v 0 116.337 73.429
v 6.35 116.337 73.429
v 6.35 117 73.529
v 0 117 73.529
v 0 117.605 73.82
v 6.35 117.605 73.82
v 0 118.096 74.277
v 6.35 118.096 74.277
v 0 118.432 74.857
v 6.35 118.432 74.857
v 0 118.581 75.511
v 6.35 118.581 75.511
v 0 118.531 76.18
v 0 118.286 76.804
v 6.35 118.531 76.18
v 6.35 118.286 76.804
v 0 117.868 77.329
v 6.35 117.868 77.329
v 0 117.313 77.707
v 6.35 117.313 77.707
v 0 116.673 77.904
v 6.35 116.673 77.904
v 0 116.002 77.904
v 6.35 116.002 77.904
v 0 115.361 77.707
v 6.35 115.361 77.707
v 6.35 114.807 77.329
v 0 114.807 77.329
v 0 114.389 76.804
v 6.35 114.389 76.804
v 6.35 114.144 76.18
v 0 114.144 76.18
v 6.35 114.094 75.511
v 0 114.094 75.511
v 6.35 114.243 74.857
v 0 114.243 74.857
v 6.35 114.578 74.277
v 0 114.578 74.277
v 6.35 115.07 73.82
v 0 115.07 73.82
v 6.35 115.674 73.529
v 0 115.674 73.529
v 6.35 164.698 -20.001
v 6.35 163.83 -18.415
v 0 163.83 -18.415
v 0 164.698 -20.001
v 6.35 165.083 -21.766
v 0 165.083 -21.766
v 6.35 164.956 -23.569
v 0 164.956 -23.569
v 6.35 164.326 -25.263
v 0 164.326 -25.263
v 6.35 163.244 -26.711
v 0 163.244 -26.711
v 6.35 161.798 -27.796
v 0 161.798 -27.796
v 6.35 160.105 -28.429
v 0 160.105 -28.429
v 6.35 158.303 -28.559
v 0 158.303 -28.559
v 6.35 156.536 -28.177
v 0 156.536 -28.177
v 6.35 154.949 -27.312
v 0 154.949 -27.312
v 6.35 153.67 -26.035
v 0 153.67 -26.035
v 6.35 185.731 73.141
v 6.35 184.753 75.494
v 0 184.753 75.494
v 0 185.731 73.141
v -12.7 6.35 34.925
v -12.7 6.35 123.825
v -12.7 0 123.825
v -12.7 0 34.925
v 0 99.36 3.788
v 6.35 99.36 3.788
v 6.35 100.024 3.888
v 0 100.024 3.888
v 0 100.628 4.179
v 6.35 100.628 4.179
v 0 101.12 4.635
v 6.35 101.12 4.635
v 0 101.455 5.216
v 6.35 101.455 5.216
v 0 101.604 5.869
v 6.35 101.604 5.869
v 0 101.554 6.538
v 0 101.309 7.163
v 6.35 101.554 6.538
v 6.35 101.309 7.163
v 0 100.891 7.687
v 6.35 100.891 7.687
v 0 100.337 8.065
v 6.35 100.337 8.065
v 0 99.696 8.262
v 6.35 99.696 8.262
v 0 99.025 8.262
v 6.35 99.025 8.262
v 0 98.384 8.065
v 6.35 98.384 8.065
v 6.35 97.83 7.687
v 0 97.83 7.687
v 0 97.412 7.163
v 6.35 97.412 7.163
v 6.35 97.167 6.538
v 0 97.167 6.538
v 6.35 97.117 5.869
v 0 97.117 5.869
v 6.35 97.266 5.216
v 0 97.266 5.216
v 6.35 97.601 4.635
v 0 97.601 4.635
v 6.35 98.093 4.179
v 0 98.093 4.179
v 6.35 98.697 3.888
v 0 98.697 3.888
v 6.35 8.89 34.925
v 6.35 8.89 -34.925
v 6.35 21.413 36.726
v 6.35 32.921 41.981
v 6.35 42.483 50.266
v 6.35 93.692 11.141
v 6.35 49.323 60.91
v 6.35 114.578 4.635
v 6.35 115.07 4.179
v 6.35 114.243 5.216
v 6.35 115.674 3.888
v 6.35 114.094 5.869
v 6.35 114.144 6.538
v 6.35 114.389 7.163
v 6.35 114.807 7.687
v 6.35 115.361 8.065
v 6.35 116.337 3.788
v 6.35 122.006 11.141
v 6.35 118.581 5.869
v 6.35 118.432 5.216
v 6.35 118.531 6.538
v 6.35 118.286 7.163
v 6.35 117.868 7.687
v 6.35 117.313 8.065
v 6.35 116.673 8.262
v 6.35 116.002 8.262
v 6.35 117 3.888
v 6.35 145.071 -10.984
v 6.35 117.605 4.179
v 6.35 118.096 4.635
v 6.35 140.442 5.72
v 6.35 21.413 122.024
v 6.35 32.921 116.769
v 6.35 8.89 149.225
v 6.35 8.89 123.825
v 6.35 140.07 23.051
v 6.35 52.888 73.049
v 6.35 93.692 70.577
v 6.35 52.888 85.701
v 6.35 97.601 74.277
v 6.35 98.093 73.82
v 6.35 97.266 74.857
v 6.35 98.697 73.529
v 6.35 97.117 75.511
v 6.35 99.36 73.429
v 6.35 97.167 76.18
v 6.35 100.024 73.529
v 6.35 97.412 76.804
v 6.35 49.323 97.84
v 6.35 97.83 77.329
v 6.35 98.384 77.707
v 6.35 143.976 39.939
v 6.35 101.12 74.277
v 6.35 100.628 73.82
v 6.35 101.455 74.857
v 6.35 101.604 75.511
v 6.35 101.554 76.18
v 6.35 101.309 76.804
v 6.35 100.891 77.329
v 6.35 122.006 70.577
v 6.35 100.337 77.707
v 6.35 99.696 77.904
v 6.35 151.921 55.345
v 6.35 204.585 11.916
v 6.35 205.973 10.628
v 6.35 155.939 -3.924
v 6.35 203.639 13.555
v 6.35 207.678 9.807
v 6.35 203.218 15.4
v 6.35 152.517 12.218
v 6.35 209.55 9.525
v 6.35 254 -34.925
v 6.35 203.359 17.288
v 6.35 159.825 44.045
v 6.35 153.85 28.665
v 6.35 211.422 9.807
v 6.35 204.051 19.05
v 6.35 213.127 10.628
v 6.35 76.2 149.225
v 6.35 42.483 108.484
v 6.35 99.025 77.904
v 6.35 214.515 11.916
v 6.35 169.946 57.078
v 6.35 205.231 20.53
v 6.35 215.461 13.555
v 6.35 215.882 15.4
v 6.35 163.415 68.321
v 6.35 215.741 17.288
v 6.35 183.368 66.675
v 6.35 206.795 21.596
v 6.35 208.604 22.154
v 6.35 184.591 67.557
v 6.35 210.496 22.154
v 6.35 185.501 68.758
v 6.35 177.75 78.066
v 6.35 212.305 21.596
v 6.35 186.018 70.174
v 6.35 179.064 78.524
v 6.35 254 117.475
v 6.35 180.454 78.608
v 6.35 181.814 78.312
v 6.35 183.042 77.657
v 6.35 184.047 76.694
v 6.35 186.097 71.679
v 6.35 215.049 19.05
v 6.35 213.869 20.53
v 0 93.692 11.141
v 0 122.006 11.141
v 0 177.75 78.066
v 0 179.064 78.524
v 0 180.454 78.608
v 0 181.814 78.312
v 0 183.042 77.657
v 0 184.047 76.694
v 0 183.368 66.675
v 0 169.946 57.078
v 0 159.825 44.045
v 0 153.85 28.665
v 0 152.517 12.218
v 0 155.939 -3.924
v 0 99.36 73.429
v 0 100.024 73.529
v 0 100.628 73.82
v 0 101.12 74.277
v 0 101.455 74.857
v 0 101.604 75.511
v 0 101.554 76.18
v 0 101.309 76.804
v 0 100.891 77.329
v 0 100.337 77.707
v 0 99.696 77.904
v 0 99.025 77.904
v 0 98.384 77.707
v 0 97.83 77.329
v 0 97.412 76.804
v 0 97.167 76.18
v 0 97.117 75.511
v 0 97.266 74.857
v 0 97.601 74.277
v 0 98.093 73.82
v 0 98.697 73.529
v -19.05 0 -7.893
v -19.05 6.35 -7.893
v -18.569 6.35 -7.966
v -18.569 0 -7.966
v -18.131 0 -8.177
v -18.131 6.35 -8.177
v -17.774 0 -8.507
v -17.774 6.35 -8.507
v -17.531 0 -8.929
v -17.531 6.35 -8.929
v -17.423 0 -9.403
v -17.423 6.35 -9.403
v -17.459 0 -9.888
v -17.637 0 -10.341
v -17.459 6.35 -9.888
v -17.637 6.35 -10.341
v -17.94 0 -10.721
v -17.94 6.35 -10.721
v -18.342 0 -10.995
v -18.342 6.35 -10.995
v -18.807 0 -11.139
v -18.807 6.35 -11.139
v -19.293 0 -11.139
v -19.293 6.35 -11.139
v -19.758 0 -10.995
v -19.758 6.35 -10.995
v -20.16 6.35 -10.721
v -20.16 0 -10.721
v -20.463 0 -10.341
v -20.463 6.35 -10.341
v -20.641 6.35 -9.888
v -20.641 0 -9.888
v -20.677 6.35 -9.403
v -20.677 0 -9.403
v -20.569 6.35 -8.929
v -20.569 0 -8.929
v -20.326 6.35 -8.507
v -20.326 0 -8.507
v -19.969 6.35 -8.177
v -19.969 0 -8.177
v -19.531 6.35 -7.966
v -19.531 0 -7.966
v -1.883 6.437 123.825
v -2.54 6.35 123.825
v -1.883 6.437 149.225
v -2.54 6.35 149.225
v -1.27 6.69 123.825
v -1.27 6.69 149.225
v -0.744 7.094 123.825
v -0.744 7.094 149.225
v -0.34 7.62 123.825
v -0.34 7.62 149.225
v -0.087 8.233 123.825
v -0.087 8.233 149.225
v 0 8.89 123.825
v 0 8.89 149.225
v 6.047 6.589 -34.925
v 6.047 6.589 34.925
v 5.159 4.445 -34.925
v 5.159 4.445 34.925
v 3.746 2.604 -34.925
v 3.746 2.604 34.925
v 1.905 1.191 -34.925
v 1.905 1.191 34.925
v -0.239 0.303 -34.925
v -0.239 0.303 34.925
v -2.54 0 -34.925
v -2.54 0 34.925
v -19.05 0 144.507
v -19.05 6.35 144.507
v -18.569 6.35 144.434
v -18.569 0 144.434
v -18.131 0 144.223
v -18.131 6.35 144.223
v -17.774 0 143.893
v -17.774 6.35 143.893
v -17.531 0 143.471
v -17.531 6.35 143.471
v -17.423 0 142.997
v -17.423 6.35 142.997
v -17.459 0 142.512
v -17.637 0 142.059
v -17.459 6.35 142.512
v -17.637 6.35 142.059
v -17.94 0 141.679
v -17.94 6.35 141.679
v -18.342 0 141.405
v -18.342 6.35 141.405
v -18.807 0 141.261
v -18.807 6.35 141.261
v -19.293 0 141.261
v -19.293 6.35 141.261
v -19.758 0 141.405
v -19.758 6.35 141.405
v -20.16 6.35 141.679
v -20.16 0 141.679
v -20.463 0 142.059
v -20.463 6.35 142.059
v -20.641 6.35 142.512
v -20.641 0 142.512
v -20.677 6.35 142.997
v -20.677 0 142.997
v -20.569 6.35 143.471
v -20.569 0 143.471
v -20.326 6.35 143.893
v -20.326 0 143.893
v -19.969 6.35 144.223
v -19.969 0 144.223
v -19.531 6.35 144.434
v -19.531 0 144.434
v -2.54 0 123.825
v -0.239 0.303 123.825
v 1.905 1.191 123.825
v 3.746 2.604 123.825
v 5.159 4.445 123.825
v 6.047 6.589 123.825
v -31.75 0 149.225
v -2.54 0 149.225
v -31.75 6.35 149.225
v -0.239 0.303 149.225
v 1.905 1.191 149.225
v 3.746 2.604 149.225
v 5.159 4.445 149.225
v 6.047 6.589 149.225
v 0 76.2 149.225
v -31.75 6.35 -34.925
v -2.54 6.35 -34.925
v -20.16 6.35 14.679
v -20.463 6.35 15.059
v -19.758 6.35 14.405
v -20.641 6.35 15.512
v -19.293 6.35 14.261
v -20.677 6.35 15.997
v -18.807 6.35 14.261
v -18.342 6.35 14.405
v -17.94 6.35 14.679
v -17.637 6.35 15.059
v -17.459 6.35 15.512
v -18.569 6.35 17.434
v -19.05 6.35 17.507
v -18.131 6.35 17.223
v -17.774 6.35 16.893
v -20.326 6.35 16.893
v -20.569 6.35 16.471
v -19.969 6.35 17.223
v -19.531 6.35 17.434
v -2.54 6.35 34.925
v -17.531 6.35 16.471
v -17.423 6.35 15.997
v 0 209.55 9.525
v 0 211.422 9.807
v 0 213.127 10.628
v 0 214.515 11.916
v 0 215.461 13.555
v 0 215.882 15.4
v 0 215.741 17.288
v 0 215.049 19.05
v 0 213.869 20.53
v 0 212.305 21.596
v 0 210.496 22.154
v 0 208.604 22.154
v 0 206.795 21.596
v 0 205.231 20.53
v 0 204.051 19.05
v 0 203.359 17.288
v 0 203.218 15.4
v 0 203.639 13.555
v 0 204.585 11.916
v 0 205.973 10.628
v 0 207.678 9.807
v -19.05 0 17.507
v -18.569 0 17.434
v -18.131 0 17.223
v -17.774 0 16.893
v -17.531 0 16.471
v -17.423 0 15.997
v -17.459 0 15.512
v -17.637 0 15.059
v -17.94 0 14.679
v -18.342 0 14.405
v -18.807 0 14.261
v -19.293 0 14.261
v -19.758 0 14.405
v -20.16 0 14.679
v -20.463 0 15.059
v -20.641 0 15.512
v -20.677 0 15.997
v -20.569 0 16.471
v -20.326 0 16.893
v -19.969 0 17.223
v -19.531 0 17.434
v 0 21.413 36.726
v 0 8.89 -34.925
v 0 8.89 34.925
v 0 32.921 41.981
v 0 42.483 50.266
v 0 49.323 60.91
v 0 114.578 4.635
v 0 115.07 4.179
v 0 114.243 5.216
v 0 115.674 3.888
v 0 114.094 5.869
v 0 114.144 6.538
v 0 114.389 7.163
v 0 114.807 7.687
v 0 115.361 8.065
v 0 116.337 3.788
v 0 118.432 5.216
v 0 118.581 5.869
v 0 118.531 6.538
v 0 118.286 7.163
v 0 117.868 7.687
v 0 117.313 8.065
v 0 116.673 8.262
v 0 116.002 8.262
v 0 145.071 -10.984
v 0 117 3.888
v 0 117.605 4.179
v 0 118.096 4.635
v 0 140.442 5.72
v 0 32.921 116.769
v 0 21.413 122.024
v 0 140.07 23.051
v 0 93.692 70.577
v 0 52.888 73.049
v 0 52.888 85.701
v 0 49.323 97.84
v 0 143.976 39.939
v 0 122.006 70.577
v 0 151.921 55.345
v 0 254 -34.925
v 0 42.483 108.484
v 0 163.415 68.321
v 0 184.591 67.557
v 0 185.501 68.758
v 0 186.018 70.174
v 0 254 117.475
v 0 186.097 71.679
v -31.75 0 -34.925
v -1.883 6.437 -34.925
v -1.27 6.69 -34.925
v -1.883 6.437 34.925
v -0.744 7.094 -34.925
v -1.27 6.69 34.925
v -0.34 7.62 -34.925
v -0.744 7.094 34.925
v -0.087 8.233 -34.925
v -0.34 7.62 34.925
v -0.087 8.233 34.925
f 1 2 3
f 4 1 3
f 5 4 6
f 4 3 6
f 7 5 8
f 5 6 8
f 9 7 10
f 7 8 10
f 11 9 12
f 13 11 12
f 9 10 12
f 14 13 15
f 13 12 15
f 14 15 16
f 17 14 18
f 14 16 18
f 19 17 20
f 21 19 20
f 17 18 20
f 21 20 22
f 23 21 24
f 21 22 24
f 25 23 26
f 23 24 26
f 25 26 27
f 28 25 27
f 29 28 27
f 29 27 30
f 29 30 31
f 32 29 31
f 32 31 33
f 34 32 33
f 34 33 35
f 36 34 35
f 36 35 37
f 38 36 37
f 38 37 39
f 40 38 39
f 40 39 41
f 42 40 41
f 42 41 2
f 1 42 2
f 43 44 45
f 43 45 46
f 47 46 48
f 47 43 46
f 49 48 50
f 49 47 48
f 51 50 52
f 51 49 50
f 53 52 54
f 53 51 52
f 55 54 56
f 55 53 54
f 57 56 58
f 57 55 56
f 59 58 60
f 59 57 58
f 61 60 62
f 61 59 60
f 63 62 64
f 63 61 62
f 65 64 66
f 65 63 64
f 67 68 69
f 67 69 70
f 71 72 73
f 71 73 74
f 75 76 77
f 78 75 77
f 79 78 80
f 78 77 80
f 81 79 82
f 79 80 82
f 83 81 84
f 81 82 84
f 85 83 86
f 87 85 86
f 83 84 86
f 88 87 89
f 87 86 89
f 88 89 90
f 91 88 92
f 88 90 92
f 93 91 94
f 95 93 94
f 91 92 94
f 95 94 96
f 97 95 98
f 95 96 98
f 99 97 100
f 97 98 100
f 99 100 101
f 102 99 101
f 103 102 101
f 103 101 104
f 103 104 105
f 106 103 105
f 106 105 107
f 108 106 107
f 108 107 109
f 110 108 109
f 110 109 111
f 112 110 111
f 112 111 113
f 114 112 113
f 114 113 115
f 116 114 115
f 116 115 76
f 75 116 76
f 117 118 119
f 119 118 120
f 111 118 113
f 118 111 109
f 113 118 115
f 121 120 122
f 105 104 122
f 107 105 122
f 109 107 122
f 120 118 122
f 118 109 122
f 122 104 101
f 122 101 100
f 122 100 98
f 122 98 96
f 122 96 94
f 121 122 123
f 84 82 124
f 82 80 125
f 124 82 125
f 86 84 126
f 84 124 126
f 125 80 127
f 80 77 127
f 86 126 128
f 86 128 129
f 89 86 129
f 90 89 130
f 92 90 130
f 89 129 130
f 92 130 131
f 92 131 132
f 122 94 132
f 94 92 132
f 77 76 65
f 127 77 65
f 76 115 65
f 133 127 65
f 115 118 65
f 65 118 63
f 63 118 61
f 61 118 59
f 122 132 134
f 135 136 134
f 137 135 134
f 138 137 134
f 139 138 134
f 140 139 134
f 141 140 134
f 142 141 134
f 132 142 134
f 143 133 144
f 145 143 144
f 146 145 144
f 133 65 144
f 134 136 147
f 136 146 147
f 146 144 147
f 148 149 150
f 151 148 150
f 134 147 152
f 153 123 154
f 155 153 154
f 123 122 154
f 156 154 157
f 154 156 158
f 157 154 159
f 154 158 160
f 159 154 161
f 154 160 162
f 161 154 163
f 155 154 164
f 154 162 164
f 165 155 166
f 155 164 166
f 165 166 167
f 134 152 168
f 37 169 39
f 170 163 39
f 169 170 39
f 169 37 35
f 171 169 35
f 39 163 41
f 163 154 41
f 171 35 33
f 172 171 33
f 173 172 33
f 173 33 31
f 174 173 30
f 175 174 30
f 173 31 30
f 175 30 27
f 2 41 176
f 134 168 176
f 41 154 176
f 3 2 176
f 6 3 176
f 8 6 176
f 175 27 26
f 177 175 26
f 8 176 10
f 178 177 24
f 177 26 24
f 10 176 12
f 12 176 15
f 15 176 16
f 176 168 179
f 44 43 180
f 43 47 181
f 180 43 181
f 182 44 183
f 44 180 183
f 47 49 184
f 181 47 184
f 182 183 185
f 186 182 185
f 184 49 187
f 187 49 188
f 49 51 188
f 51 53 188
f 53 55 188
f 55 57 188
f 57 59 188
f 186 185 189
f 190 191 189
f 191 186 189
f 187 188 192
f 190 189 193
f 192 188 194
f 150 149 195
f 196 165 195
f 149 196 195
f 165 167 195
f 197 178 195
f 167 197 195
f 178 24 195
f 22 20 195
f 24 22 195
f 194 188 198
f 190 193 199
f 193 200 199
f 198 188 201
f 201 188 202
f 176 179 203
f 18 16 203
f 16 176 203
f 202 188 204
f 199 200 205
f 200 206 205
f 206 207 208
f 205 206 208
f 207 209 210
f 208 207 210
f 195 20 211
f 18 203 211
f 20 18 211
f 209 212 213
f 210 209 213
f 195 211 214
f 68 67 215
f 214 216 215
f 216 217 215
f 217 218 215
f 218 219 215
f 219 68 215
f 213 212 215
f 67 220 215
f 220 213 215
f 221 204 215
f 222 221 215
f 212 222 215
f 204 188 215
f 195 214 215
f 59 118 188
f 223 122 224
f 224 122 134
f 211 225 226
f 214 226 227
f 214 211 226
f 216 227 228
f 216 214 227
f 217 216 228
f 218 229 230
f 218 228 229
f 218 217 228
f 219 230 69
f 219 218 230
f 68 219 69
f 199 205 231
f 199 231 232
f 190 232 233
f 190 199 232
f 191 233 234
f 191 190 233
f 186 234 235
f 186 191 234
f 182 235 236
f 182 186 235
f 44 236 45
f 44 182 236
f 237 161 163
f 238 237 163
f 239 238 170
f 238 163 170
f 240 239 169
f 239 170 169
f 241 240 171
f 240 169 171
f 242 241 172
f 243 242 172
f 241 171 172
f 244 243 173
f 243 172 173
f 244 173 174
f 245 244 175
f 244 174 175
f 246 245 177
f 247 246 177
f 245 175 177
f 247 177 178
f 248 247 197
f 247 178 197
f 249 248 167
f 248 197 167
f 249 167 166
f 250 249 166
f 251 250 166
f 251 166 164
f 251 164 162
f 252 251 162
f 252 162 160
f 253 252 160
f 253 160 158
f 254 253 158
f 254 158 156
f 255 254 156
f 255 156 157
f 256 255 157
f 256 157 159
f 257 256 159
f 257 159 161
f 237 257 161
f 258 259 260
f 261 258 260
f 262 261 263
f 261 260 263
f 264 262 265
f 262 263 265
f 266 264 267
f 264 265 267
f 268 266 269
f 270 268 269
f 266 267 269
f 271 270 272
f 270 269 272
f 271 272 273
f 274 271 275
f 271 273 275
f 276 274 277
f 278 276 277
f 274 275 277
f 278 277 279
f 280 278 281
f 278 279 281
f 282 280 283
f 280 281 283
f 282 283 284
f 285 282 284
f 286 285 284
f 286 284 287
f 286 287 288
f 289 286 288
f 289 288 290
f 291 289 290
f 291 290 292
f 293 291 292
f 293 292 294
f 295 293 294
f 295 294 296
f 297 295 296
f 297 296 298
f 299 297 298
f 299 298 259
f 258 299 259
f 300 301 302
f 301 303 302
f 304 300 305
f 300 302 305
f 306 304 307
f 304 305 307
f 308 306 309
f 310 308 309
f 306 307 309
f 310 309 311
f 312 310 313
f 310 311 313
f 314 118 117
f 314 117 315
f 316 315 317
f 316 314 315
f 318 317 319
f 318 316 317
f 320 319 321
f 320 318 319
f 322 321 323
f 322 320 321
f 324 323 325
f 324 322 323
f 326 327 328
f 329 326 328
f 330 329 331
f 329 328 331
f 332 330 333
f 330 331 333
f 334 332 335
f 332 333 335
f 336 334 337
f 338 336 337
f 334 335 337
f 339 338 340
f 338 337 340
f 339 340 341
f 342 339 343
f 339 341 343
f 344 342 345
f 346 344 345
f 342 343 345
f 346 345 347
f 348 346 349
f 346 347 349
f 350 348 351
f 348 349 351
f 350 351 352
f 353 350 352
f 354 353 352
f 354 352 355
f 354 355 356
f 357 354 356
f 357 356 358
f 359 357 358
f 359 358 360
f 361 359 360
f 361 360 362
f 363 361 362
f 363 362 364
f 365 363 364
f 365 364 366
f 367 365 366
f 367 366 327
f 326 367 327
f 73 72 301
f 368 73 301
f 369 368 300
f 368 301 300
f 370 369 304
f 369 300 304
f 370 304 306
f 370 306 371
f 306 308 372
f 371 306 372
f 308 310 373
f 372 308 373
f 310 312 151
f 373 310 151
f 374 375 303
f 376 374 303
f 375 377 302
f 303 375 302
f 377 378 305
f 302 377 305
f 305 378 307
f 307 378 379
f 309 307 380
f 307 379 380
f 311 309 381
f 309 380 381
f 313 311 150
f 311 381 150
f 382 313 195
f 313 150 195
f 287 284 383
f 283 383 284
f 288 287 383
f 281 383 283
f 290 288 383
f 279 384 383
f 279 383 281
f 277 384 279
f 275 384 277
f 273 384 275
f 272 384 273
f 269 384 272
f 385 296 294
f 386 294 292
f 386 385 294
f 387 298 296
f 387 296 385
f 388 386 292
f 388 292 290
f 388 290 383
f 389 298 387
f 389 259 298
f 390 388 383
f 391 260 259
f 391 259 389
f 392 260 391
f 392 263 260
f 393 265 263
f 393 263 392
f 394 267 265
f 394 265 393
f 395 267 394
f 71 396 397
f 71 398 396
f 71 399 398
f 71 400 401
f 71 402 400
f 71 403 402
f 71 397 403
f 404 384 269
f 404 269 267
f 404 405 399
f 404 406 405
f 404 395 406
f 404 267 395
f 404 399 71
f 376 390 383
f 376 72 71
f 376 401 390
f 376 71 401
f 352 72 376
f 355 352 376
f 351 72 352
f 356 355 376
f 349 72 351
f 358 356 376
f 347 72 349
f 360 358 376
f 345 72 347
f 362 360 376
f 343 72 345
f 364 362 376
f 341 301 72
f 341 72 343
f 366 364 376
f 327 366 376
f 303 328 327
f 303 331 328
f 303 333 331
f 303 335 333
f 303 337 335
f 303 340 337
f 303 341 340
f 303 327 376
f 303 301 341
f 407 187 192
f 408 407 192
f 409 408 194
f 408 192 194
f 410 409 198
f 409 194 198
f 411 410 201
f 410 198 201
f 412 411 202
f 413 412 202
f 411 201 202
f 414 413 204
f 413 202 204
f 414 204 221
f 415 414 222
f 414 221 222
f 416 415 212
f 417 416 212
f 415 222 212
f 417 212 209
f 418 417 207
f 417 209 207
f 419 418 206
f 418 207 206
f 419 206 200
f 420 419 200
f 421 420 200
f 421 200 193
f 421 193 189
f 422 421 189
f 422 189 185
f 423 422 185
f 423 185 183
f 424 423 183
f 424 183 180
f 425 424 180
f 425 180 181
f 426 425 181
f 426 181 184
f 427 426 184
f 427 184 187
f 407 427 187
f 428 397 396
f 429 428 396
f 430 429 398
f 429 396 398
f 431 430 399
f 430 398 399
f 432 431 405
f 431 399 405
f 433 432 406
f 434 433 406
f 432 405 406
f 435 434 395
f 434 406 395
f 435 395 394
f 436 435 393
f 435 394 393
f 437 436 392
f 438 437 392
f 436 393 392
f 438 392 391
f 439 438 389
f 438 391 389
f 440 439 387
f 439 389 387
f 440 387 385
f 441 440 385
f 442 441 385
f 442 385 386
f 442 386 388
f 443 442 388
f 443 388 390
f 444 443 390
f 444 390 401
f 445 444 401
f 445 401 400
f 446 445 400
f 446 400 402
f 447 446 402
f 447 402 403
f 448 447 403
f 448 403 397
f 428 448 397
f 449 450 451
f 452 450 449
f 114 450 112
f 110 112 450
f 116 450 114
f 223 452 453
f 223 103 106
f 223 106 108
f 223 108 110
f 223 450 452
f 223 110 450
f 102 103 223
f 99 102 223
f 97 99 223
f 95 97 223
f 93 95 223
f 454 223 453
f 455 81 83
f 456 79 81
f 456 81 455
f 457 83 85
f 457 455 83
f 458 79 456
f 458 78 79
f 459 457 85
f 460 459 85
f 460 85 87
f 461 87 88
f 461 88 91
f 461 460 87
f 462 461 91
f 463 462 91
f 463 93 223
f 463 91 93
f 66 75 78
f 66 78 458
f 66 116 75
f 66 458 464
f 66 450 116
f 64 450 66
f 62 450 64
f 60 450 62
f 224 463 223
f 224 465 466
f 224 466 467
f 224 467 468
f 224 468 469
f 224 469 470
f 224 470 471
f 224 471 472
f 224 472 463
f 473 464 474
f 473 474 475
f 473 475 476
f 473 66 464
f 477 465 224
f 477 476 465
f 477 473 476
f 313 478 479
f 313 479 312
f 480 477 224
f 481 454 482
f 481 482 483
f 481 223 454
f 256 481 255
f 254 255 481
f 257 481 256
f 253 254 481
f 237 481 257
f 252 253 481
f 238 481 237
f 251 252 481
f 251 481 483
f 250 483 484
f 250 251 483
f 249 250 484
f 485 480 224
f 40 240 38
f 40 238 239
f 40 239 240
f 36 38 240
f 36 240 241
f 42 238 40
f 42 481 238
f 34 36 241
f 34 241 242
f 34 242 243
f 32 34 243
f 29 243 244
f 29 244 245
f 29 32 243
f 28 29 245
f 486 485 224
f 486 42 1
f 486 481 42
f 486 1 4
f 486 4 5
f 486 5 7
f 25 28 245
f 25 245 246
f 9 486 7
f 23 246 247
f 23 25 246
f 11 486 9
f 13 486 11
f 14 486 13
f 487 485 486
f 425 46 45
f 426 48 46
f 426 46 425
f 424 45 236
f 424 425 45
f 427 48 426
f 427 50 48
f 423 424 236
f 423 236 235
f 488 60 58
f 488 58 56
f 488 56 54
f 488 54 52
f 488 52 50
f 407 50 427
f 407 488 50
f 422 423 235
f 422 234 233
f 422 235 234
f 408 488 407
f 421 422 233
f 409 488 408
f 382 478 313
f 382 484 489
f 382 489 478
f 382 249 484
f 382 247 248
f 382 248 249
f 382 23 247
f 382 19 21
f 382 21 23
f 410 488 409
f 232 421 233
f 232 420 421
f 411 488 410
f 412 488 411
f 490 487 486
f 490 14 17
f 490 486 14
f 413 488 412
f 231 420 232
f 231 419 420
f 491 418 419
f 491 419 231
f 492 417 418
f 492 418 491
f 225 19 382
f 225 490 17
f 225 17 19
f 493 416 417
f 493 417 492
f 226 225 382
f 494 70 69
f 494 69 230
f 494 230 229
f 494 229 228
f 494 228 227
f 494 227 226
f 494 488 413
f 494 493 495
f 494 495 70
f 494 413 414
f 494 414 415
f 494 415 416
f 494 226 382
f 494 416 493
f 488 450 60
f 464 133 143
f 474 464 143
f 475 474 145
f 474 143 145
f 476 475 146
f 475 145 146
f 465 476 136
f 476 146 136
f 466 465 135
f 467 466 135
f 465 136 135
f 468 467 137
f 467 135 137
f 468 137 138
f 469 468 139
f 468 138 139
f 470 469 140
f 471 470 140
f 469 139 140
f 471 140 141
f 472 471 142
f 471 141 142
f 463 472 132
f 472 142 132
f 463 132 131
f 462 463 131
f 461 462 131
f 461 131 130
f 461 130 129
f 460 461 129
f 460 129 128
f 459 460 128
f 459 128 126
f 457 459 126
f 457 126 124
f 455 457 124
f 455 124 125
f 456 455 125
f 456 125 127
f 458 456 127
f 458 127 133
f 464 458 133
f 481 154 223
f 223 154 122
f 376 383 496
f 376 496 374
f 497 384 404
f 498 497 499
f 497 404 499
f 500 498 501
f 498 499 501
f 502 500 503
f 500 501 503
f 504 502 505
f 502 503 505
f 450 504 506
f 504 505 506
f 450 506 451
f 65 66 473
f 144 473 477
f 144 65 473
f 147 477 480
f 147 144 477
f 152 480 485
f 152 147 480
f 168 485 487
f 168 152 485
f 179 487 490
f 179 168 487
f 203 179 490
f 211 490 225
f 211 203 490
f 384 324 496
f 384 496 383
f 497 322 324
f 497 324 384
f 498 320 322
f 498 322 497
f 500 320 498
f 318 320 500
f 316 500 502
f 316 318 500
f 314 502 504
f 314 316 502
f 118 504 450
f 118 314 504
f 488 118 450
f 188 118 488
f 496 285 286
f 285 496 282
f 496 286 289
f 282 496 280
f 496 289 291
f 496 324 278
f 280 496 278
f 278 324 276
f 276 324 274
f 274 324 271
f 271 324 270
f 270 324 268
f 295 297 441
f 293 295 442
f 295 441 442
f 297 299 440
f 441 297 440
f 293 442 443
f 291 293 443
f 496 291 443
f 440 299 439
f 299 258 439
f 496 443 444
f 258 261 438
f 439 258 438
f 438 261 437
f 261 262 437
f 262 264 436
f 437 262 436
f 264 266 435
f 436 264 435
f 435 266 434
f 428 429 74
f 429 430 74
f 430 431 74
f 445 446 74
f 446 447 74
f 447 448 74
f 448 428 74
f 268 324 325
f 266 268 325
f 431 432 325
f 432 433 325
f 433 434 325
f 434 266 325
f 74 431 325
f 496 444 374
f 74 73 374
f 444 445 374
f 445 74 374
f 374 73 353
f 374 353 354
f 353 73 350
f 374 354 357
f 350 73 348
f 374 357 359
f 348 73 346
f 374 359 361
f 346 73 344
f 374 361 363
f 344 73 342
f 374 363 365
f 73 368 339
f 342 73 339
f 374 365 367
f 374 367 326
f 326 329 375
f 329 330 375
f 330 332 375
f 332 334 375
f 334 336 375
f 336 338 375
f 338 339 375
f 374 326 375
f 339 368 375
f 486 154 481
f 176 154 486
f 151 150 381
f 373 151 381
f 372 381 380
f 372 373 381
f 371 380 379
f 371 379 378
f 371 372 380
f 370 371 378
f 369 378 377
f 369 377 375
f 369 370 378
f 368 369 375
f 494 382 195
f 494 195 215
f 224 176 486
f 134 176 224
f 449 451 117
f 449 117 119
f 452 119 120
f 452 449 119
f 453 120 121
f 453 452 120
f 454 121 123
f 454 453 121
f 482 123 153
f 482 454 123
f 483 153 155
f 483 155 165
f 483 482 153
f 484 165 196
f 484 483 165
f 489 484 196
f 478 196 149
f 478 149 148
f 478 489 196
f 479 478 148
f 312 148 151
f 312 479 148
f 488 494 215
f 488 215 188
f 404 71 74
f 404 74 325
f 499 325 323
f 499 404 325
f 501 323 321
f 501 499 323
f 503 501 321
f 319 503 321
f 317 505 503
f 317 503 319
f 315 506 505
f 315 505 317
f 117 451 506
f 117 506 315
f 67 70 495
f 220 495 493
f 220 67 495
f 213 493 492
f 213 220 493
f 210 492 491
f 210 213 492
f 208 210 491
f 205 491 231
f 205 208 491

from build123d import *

# Parameters (mm, degrees)
BOSS_EXTRUDE1_DEPTH  = 6.35
SKETCH5_W            = 184.15
SKETCH5_H            = 6.35
BOSS_EXTRUDE4_DEPTH  = 31.75
SKETCH6_W            = 12.7
SKETCH6_H            = 88.9
CUT_EXTRUDE2_DEPTH   = 291.872284044
CUT_EXTRUDE3_REACH   = 299.045
SKETCH7_R            = 2.25
SKETCH7_W            = 59.436
SKETCH7_H            = 28.313784743
SKETCH8_R            = 6.35
CUT_EXTRUDE4_DEPTH   = 298.044963979
FILLET1_R            = 2.54
CONVERT_SOLID1_START = -34.925
CONVERT_SOLID1_DEPTH = 184.15
CUT_EXTRUDE5_REACH   = 299.045
CUT_EXTRUDE6_REACH   = 292.872
SKETCH10_R           = 1.63195


# Read off the part's stored shape, not the designer's step: Convert-Solid1
with BuildPart() as part:
    # Sketch1 → Boss-Extrude1 (new body)
    with BuildSketch(Plane(origin=(0, 0, 0), x_dir=(0, 0, -1), z_dir=(1, 0, 0))):
        with BuildLine():
            Line((-117.475, 254), (34.925, 254))
            Line((34.925, 254), (34.925, 8.89))
            Line((34.925, 8.89), (34.925, 0))
            Line((34.925, 0), (-34.925, 0))
            Line((-34.925, 0), (-34.925, 8.89))
            ThreePointArc((-34.925, 8.89), (-79.375, 53.34), (-123.825, 8.89))
            Line((-123.825, 8.89), (-123.825, 0))
            Line((-123.825, 0), (-149.225, 0))
            Line((-149.225, 0), (-149.225, 76.2))
            Line((-149.225, 76.2), (-117.475, 254))
        make_face()
    extrude(amount=BOSS_EXTRUDE1_DEPTH)

    # Sketch5 → Boss-Extrude4 (add)
    with BuildSketch(Plane.ZY):
        with Locations((57.15, 3.175)):
            Rectangle(SKETCH5_W, SKETCH5_H)
    extrude(amount=BOSS_EXTRUDE4_DEPTH)

    # Sketch6 → Cut-Extrude2 (cut, through all)
    with BuildSketch(Plane(origin=(0, 6.35, 0), x_dir=(1, 0, 0), z_dir=(0, 1, 0))):
        with Locations((-6.35, -79.375)):
            Rectangle(SKETCH6_W, SKETCH6_H)
    extrude(amount=-CUT_EXTRUDE2_DEPTH, mode=Mode.SUBTRACT)

    # Sketch7 → Cut-Extrude3 (cut, up to next)
    with BuildSketch(Plane(origin=(6.35, 0, 0), x_dir=(0, 0, -1), z_dir=(1, 0, 0)), mode=Mode.PRIVATE) as cut_extrude3_sk1:
        with Locations((-75.679460058, 116.337237118)):
            Circle(SKETCH7_R)
    cut_extrude3_tool1 = extrude(cut_extrude3_sk1.sketch, amount=-CUT_EXTRUDE3_REACH, mode=Mode.PRIVATE) & part.part
    # Sketch7 → Cut-Extrude3 (cut, up to next)
    with BuildSketch(Plane(origin=(6.35, 0, 0), x_dir=(0, 0, -1), z_dir=(1, 0, 0)), mode=Mode.PRIVATE) as cut_extrude3_sk2:
        with Locations((-75.679460058, 99.360389657)):
            Circle(SKETCH7_R)
    cut_extrude3_tool2 = extrude(cut_extrude3_sk2.sketch, amount=-CUT_EXTRUDE3_REACH, mode=Mode.PRIVATE) & part.part
    # Sketch7 → Cut-Extrude3 (cut, up to next)
    with BuildSketch(Plane(origin=(6.35, 0, 0), x_dir=(0, 0, -1), z_dir=(1, 0, 0)), mode=Mode.PRIVATE) as cut_extrude3_sk3:
        with Locations((-6.03755368, 99.360389657)):
            Circle(SKETCH7_R)
    cut_extrude3_tool3 = extrude(cut_extrude3_sk3.sketch, amount=-CUT_EXTRUDE3_REACH, mode=Mode.PRIVATE) & part.part
    # Sketch7 → Cut-Extrude3 (cut, up to next)
    with BuildSketch(Plane(origin=(6.35, 0, 0), x_dir=(0, 0, -1), z_dir=(1, 0, 0)), mode=Mode.PRIVATE) as cut_extrude3_sk4:
        with Locations((-6.03755368, 116.337237118)):
            Circle(SKETCH7_R)
    cut_extrude3_tool4 = extrude(cut_extrude3_sk4.sketch, amount=-CUT_EXTRUDE3_REACH, mode=Mode.PRIVATE) & part.part
    # Sketch7 → Cut-Extrude3 (cut, up to next)
    with BuildSketch(Plane(origin=(6.35, 0, 0), x_dir=(0, 0, -1), z_dir=(1, 0, 0)), mode=Mode.PRIVATE) as cut_extrude3_sk5:
        with Locations((-40.858506869, 107.848813388)):
            Rectangle(SKETCH7_W, SKETCH7_H)
    cut_extrude3_tool5 = extrude(cut_extrude3_sk5.sketch, amount=-CUT_EXTRUDE3_REACH, mode=Mode.PRIVATE) & part.part
    add(cut_extrude3_tool1.solids().sort_by_distance((6.35, 116.337237, 75.67946))[0], mode=Mode.SUBTRACT)
    add(cut_extrude3_tool2.solids().sort_by_distance((6.35, 99.36039, 75.67946))[0], mode=Mode.SUBTRACT)
    add(cut_extrude3_tool3.solids().sort_by_distance((6.35, 99.36039, 6.037554))[0], mode=Mode.SUBTRACT)
    add(cut_extrude3_tool4.solids().sort_by_distance((6.35, 116.337237, 6.037554))[0], mode=Mode.SUBTRACT)
    add(cut_extrude3_tool5.solids().sort_by_distance((6.35, 107.848813, 40.858507))[0], mode=Mode.SUBTRACT)

    # Sketch8 → Cut-Extrude4 (cut, through all)
    with BuildSketch(Plane(origin=(6.35, 0, 0), x_dir=(0, 0, -1), z_dir=(1, 0, 0))):
        with Locations((-15.875, 209.55)):
            Circle(SKETCH8_R)
    extrude(amount=-CUT_EXTRUDE4_DEPTH, mode=Mode.SUBTRACT)

    # Fillet1
    fillet1_edges = [part.edges().sort_by_distance(p)[0] for p in [
        (0, 6.35, 136.525),
        (0, 6.35, 0),
    ]]
    fillet(fillet1_edges, radius=FILLET1_R)

    # Convert-Solid1 outline → Convert-Solid1 (cut)
    with BuildSketch(Plane.XY.offset(CONVERT_SOLID1_START)):
        with BuildLine():
            ThreePointArc((6.35, 8.89), (3.746179285, 2.603820715), (-2.54, 0))
            Line((-2.54, 0), (6.35, 0))
            Line((6.35, 0), (6.35, 8.89))
        make_face()
    extrude(amount=CONVERT_SOLID1_DEPTH, mode=Mode.SUBTRACT)

    # Sketch9 → Cut-Extrude5 (cut, up to next)
    with BuildSketch(Plane(origin=(6.35, 0, 0), x_dir=(0, 0, -1), z_dir=(1, 0, 0)), mode=Mode.PRIVATE) as cut_extrude5_sk1:
        with BuildLine():
            Line((-75.494212356, 184.752903033), (-73.141435562, 185.731480776))
            ThreePointArc((-73.141435562, 185.731480776), (-69.446832384, 185.812370314), (-66.675, 183.368279277))
            ThreePointArc((-66.675, 183.368279277), (-28.664883279, 153.84953873), (18.415, 163.83))
            ThreePointArc((18.415, 163.83), (27.305, 162.56), (26.035, 153.67))
            ThreePointArc((26.035, 153.67), (-31.616379009, 141.496848075), (-78.066338809, 177.749687467))
            ThreePointArc((-78.066338809, 177.749687467), (-78.311881244, 181.813820193), (-75.494212356, 184.752903033))
        make_face()
    cut_extrude5_tool1 = extrude(cut_extrude5_sk1.sketch, amount=-CUT_EXTRUDE5_REACH, mode=Mode.PRIVATE) & part.part
    add(cut_extrude5_tool1.solids().sort_by_distance((6.35, 181.411079, 77.215324))[0], mode=Mode.SUBTRACT)

    # Sketch10 → Cut-Extrude6 (cut, up to next)
    with BuildSketch(Plane(origin=(0, 6.35, 0), x_dir=(1, 0, 0), z_dir=(0, 1, 0)), mode=Mode.PRIVATE) as cut_extrude6_sk1:
        with Locations(Location((-19.05, 9.525, 0), (0, 0, 270))):
            Circle(SKETCH10_R)
    cut_extrude6_tool1 = extrude(cut_extrude6_sk1.sketch, amount=-CUT_EXTRUDE6_REACH, mode=Mode.PRIVATE) & part.part
    # Sketch10 → Cut-Extrude6 (cut, up to next)
    with BuildSketch(Plane(origin=(0, 6.35, 0), x_dir=(1, 0, 0), z_dir=(0, 1, 0)), mode=Mode.PRIVATE) as cut_extrude6_sk2:
        with Locations(Location((-19.05, -15.875, 0), (0, 0, 270))):
            Circle(SKETCH10_R)
    cut_extrude6_tool2 = extrude(cut_extrude6_sk2.sketch, amount=-CUT_EXTRUDE6_REACH, mode=Mode.PRIVATE) & part.part
    # Sketch10 → Cut-Extrude6 (cut, up to next)
    with BuildSketch(Plane(origin=(0, 6.35, 0), x_dir=(1, 0, 0), z_dir=(0, 1, 0)), mode=Mode.PRIVATE) as cut_extrude6_sk3:
        with Locations(Location((-19.05, -142.875, 0), (0, 0, 270))):
            Circle(SKETCH10_R)
    cut_extrude6_tool3 = extrude(cut_extrude6_sk3.sketch, amount=-CUT_EXTRUDE6_REACH, mode=Mode.PRIVATE) & part.part
    add(cut_extrude6_tool1.solids().sort_by_distance((-19.05, 6.35, -9.525))[0], mode=Mode.SUBTRACT)
    add(cut_extrude6_tool2.solids().sort_by_distance((-19.05, 6.35, 15.875))[0], mode=Mode.SUBTRACT)
    add(cut_extrude6_tool3.solids().sort_by_distance((-19.05, 6.35, 142.875))[0], mode=Mode.SUBTRACT)


solid = part.part
